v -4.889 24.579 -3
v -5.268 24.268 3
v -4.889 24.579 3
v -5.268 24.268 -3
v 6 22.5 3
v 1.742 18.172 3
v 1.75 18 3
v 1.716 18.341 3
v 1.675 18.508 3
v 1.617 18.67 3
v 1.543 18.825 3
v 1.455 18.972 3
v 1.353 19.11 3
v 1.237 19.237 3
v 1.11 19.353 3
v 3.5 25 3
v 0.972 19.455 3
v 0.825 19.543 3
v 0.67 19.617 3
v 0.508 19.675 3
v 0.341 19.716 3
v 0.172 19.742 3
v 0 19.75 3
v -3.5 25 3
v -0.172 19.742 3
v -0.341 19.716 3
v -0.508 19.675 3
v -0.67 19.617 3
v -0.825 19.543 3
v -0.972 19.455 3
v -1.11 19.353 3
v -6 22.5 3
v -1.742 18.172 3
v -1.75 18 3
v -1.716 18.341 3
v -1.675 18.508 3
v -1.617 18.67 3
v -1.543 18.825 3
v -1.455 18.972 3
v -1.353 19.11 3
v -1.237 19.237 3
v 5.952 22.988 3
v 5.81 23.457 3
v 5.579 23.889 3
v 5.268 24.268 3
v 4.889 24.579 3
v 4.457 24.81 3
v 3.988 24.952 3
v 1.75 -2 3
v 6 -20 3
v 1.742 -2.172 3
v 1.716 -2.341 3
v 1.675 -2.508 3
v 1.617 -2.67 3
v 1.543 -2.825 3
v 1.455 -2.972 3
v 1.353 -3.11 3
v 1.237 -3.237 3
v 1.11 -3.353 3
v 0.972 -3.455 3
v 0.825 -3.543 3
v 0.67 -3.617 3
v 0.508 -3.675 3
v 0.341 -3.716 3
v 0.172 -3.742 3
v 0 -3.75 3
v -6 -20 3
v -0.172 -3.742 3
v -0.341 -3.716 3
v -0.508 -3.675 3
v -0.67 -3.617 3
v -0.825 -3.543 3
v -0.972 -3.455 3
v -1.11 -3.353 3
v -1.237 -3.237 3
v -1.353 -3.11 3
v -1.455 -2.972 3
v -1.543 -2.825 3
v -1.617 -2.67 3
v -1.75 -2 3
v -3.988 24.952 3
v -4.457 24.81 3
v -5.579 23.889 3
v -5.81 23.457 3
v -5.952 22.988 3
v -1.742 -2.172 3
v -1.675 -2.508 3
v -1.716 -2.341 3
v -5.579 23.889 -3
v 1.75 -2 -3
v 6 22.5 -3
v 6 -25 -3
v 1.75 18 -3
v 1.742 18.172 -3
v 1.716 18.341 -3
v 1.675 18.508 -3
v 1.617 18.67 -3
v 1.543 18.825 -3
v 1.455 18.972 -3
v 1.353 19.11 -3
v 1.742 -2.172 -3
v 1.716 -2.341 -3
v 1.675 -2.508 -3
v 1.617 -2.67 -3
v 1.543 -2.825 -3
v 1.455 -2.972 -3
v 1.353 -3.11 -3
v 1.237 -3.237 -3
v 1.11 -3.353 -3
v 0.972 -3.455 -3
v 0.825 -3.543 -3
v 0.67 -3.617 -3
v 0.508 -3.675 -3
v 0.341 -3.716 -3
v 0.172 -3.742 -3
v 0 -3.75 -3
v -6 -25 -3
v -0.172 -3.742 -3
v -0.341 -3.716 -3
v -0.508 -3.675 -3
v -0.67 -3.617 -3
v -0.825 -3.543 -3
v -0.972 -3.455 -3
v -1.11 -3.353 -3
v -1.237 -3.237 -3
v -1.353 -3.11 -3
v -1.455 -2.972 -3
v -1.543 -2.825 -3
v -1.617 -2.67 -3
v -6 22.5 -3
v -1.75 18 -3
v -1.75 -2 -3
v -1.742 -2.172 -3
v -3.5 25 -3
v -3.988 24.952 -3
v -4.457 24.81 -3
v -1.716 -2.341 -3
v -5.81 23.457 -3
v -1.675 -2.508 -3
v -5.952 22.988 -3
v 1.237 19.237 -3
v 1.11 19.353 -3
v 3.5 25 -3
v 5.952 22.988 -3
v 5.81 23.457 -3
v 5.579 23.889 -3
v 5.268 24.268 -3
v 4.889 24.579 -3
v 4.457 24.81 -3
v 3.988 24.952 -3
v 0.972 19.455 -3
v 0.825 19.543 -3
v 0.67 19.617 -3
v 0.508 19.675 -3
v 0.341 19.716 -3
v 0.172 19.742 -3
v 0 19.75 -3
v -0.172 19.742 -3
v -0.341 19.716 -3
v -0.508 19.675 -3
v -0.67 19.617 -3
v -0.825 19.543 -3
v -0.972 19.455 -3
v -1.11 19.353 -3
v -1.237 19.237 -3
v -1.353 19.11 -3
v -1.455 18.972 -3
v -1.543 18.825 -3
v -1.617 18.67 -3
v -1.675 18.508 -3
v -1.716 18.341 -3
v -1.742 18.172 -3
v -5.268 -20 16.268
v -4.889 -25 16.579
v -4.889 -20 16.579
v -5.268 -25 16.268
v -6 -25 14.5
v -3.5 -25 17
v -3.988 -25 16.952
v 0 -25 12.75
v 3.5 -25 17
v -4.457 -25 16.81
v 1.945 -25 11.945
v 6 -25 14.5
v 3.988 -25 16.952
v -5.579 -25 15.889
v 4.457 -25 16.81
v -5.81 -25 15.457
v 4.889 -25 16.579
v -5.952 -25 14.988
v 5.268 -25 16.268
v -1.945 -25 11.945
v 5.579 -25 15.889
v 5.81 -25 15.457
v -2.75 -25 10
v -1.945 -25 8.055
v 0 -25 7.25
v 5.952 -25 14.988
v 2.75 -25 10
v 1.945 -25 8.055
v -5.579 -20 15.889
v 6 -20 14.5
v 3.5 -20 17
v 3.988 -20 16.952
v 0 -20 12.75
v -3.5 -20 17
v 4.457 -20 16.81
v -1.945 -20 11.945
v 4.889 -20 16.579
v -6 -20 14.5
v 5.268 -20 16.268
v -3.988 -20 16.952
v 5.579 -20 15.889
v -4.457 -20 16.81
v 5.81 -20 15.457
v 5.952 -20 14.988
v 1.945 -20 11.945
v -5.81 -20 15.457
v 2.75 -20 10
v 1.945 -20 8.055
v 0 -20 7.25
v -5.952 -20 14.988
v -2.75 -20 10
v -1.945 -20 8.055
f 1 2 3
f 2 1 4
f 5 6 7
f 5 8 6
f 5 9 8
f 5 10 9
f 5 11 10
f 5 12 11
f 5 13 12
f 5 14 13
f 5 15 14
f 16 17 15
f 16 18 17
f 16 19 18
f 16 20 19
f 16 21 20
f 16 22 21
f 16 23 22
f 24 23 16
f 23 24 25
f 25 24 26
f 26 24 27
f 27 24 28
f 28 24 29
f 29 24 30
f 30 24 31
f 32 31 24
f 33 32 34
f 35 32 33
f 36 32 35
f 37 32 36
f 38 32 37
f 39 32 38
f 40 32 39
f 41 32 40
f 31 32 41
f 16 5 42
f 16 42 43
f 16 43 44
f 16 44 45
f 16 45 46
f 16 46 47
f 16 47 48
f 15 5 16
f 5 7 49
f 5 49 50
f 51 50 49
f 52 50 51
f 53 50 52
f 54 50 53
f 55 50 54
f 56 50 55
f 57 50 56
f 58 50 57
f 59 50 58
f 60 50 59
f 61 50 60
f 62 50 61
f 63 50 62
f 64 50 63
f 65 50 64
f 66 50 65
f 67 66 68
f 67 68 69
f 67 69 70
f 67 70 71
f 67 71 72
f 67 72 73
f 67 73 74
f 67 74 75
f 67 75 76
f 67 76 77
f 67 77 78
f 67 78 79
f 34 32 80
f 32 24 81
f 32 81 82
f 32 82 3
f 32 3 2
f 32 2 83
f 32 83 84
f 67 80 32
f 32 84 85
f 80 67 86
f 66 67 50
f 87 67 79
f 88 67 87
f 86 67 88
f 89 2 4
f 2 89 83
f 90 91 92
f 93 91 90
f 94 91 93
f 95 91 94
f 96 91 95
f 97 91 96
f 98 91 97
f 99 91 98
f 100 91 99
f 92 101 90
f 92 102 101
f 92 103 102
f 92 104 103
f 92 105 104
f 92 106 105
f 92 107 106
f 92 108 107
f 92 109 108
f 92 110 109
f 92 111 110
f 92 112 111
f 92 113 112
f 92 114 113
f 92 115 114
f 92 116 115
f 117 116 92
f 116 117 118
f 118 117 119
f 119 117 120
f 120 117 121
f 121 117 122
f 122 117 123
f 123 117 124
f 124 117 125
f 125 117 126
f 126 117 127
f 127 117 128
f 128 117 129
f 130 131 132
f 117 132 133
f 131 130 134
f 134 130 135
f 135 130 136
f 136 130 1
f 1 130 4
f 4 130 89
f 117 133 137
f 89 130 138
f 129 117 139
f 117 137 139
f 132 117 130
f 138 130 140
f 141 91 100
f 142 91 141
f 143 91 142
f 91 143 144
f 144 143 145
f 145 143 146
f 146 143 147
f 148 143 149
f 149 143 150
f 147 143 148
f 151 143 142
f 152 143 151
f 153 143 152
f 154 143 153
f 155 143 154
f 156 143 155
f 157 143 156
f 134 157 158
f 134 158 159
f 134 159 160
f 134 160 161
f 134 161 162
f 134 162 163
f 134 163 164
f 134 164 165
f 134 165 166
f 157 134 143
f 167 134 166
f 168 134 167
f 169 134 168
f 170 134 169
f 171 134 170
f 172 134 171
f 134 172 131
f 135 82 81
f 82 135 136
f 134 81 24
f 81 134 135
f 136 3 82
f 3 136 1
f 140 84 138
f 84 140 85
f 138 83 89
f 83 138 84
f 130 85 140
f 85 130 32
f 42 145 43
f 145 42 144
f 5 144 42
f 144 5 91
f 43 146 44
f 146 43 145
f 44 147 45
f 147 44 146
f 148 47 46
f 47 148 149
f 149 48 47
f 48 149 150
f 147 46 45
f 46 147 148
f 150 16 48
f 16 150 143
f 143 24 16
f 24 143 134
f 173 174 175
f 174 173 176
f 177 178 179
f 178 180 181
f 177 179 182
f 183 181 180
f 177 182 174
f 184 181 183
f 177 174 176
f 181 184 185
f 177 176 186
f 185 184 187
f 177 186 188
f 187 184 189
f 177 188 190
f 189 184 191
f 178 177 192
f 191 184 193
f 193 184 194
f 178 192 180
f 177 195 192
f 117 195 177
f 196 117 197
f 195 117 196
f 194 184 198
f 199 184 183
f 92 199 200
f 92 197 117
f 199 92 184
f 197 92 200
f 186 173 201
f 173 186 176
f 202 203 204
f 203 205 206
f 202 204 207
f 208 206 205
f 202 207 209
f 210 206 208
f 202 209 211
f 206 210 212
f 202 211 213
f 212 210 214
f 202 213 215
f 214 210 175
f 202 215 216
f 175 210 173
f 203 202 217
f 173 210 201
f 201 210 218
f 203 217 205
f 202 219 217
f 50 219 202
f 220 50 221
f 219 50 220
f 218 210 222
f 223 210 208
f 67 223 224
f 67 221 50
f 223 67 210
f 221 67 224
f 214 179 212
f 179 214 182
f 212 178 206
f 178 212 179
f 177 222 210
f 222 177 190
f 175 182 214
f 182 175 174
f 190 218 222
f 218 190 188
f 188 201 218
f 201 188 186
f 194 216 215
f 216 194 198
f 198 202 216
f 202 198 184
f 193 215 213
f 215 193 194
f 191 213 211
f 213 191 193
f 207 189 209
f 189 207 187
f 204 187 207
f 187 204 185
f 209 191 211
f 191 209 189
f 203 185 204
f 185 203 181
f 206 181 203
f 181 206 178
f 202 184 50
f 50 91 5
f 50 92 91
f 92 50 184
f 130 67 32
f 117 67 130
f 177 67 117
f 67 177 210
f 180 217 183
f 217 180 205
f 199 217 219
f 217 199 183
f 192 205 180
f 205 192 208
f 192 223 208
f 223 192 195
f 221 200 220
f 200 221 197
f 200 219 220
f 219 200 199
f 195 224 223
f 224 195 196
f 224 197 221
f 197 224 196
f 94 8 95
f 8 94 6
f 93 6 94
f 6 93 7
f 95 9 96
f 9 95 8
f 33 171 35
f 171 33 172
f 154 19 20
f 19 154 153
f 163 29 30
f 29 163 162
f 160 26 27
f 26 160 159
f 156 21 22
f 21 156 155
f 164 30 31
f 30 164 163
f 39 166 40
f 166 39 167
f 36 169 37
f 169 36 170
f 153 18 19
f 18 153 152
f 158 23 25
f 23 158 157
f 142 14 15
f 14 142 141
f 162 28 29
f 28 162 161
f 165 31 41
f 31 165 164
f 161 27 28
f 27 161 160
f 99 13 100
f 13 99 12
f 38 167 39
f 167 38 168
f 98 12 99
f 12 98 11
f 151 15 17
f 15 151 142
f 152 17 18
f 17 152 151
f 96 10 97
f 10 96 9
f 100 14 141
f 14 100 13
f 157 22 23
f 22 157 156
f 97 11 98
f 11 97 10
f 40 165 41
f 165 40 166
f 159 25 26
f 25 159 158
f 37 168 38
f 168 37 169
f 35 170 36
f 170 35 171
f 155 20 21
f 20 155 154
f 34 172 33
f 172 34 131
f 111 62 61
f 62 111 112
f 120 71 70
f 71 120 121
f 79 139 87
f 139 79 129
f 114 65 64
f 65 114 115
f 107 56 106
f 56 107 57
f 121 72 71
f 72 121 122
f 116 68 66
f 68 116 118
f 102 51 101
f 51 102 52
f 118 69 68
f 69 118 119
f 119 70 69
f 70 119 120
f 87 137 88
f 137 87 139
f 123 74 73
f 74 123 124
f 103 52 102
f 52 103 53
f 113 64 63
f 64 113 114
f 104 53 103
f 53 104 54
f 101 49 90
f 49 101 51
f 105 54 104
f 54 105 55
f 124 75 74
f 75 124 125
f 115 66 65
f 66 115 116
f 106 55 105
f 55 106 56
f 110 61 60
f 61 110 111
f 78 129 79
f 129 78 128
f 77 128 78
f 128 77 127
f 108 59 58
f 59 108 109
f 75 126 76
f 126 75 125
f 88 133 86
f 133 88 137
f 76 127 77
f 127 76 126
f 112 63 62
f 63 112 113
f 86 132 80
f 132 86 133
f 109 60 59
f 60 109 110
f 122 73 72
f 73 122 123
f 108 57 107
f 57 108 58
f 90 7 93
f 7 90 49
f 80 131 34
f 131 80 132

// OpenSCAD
z = 6;
z2 = z+14;
x = 12;
y = 45;
d = 5;

difference(){
    union(){
        cube([x,y,z],center=true);
        translate([0,22.5,0])roundy(h=z);
        translate([0,-y/2,7-1.25])cube([x,5,z2-d/2],center=true);
        translate([0,-y/2,z/2+14-d/2])rotate([90,0,0])roundy(h=5);
    }
    //single bolt cutout
    translate([0,-22.5,z2/2])rotate([90,0,0])cylinder(d=5.5,h=10,center=true,$fn=8);
    //slider cutout
    translate([0,18,0])cylinder(d=3.5,h=z+1,$fn=64,center=true);
    translate([0,-2,0])cylinder(d=3.5,h=z+1,$fn=64,center=true);
    translate([0,8,0])cube([3.5,20,z+1],center=true);
    //end slider
}

module roundy(){
        translate([-3.5,0,0])cylinder(d=d,h=h,center=true,$fn=32);
        translate([3.5,0,0])cylinder(d=d,h=h,center=true,$fn=32);
        translate([0,0,0])cube([7,5,h],center=true);
}
